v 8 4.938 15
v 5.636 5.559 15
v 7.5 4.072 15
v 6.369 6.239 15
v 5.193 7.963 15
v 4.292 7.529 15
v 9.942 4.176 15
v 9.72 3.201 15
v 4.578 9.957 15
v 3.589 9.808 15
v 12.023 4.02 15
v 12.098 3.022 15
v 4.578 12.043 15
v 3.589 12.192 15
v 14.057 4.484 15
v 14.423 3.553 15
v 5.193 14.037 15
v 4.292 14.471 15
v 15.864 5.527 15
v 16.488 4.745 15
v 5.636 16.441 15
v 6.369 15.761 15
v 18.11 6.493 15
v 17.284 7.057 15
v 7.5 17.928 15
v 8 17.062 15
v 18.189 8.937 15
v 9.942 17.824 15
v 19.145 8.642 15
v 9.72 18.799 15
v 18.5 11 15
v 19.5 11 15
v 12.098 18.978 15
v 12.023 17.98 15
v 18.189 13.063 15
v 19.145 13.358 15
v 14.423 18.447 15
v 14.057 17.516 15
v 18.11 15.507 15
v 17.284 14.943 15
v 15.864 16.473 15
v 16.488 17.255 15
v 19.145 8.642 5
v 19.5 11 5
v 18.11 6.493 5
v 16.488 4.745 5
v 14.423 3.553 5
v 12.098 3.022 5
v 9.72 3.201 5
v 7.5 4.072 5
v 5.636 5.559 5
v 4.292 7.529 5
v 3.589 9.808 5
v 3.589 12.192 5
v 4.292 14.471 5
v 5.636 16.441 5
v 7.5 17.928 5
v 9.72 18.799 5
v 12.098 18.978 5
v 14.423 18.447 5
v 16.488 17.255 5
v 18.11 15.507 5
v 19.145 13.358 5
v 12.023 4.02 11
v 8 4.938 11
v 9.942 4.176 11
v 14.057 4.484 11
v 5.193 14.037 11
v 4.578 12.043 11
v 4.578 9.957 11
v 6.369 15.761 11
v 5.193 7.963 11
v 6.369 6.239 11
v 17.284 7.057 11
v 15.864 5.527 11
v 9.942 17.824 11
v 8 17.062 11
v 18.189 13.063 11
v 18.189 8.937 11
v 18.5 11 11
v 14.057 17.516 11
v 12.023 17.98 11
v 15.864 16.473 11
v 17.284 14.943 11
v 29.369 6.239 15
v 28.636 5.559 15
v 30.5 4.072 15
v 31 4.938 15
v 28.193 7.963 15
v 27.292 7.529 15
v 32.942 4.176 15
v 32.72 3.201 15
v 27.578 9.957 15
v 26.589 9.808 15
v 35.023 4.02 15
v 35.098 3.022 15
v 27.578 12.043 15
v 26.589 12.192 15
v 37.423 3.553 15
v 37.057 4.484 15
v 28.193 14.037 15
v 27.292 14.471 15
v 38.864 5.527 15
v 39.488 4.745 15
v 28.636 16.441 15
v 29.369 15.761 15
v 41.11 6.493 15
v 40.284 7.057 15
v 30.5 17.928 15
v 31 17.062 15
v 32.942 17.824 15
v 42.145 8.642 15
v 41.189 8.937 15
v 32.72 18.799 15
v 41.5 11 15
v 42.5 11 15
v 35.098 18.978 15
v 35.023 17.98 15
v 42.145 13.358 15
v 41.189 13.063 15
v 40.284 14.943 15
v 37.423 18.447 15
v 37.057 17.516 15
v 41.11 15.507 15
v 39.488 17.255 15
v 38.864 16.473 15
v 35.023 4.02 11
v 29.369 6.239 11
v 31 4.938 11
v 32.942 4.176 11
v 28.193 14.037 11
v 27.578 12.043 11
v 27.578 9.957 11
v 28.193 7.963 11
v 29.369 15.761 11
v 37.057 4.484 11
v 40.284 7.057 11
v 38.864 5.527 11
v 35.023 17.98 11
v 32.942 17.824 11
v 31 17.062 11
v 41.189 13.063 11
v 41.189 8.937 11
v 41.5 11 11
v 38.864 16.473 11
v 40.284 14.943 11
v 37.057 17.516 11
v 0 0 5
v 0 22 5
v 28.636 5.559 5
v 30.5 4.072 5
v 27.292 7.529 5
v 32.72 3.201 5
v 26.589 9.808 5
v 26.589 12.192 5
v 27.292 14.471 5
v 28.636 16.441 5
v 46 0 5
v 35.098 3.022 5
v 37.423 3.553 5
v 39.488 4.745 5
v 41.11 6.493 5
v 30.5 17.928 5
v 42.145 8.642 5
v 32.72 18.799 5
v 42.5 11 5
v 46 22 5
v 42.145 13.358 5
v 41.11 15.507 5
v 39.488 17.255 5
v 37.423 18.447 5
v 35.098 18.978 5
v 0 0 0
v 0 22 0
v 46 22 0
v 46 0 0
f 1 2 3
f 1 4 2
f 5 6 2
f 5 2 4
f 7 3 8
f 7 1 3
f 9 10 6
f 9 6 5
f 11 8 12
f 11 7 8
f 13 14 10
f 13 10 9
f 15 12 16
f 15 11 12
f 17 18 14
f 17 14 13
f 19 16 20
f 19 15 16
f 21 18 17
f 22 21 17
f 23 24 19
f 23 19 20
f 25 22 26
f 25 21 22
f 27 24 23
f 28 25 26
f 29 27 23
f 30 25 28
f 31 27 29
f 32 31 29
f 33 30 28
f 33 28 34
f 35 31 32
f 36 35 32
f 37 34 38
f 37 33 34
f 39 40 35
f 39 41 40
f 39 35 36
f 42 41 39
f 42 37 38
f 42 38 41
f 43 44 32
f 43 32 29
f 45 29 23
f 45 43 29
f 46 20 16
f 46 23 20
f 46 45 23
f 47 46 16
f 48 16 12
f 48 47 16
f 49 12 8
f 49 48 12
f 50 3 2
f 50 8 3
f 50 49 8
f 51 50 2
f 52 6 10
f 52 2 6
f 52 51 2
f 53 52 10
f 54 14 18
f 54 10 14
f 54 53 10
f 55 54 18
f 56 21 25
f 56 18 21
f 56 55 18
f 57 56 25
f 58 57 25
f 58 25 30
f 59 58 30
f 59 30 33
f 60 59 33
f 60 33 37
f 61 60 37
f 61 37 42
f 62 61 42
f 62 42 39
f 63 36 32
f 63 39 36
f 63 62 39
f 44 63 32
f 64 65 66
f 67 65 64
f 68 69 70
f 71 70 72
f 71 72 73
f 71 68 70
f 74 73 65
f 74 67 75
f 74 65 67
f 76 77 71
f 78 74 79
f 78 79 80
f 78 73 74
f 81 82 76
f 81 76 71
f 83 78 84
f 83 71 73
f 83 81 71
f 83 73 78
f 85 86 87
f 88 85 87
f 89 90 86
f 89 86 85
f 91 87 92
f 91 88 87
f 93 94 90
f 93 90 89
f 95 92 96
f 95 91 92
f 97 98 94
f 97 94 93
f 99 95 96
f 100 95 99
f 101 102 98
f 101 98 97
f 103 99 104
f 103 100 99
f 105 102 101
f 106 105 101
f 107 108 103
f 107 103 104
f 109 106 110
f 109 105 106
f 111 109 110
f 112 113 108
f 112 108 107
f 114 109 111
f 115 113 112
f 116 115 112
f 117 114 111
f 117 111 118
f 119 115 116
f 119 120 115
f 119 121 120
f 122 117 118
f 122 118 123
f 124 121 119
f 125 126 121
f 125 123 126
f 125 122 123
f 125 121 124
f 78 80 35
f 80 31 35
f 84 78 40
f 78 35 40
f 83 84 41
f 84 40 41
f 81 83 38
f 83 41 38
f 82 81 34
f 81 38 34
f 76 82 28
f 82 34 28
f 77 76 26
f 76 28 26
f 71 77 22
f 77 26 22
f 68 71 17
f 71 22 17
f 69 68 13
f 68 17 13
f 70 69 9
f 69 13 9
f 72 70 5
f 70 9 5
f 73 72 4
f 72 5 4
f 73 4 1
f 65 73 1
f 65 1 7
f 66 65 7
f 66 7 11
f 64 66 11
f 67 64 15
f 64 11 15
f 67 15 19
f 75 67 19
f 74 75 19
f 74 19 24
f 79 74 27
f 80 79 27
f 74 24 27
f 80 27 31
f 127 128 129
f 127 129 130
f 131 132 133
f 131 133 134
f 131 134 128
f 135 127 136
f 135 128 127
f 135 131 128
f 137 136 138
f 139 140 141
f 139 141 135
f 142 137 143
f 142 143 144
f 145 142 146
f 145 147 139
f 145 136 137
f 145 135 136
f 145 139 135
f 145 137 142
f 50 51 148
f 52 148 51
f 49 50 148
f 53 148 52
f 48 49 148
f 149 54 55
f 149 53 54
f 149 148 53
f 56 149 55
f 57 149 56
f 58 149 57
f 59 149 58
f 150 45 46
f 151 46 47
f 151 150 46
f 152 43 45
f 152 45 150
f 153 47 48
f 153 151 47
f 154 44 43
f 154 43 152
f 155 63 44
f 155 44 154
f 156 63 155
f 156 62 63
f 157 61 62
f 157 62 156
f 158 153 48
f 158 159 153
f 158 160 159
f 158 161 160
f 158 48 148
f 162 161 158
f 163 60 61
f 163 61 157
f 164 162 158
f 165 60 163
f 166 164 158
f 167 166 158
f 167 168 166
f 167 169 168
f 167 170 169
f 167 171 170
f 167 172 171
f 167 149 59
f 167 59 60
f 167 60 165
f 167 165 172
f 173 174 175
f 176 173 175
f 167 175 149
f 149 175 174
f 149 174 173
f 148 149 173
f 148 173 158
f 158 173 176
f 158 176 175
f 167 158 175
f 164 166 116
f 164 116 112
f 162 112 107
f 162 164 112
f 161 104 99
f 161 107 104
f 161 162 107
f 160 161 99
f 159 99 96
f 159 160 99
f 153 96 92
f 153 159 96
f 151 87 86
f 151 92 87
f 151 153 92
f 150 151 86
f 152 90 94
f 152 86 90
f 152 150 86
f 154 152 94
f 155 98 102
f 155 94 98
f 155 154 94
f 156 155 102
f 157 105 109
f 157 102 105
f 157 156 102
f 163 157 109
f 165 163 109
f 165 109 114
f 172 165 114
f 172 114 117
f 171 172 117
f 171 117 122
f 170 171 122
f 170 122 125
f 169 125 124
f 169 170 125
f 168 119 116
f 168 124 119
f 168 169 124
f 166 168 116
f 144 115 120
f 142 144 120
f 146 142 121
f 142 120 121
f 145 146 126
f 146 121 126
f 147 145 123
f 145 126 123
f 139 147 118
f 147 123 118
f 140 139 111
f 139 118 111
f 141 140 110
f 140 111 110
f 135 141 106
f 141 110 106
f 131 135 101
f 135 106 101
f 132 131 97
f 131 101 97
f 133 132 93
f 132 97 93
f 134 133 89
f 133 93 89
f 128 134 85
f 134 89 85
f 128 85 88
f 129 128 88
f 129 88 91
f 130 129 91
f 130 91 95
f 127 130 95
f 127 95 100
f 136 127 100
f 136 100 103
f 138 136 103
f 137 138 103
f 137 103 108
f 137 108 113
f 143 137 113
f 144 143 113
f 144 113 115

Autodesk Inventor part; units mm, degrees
ref_plane "YZ Plane" through (0, 0, 0) normal (1, 0, 0) x (0, 1, 0)
ref_plane "XZ Plane" through (0, 0, 0) normal (0, 1, 0) x (-1, 0, 0)
ref_plane "XY Plane" through (0, 0, 0) normal (0, 0, 1) x (1, 0, 0)
sketch "Sketch1" plane through (0, 0, 0) normal (0, 0, 1) x (1, 0, 0)
  line L0 (0, 0) -> (46, 0)
  line L1 (46, 0) -> (46, 22)
  line L2 (46, 22) -> (0, 22)
  line L3 (0, 22) -> (0, 0)
  dimension "d0" = 46
  dimension "d1" = 22
extrude "Extrusion1" add sketch "Sketch1" along normal blind 5
sketch "Sketch2" plane through (0, 0, 5) normal (0, 0, 1) x (1, 0, 0)
  line L0 (0, 0) -> (46, 0) projected
  line L1 (46, 0) -> (46, 22) projected
  circle A0 centre (11.5, 11) radius 8
  circle A1 centre (34.5, 11) radius 8
  point P0 (23, 0)
  point P1 (23, 21.9141)
  point P2 (23, 11)
  point P3 (0, 11)
  point P4 (46, 11)
  dimension "d4" = 16
  dimension "d5" = 16
extrude "Extrusion2" add sketch "Sketch2" along normal blind 10
sketch "Sketch3" plane through (11.5, 11, 15) normal (0, 0, 1) x (1, 0, 0)
  circle A0 centre (0, 0) radius 7
  point P0 (-11.5, -11)
  dimension "d8" = 14
sketch "Sketch4" plane through (34.5, 11, 15) normal (0, 0, 1) x (1, 0, 0)
  circle A0 centre (0, 0) radius 7
  point P0 (-34.5, -11)
  dimension "d9" = 14
extrude "Extrusion3" cut sketch "Sketch3" against normal blind 4
extrude "Extrusion4" cut sketch "Sketch4" against normal blind 4
sketch "Sketch5" plane through (11.5, 11, 11) normal (0, 0, 1) x (1, 0, 0)
  point P0 (-11.5, -11)
sketch "Sketch6" plane through (0, 0, 5) normal (0, 0, 1) x (1, 0, 0)
  point P0 (0, 0)
properties part number "ir sensor" material "Titanium"
